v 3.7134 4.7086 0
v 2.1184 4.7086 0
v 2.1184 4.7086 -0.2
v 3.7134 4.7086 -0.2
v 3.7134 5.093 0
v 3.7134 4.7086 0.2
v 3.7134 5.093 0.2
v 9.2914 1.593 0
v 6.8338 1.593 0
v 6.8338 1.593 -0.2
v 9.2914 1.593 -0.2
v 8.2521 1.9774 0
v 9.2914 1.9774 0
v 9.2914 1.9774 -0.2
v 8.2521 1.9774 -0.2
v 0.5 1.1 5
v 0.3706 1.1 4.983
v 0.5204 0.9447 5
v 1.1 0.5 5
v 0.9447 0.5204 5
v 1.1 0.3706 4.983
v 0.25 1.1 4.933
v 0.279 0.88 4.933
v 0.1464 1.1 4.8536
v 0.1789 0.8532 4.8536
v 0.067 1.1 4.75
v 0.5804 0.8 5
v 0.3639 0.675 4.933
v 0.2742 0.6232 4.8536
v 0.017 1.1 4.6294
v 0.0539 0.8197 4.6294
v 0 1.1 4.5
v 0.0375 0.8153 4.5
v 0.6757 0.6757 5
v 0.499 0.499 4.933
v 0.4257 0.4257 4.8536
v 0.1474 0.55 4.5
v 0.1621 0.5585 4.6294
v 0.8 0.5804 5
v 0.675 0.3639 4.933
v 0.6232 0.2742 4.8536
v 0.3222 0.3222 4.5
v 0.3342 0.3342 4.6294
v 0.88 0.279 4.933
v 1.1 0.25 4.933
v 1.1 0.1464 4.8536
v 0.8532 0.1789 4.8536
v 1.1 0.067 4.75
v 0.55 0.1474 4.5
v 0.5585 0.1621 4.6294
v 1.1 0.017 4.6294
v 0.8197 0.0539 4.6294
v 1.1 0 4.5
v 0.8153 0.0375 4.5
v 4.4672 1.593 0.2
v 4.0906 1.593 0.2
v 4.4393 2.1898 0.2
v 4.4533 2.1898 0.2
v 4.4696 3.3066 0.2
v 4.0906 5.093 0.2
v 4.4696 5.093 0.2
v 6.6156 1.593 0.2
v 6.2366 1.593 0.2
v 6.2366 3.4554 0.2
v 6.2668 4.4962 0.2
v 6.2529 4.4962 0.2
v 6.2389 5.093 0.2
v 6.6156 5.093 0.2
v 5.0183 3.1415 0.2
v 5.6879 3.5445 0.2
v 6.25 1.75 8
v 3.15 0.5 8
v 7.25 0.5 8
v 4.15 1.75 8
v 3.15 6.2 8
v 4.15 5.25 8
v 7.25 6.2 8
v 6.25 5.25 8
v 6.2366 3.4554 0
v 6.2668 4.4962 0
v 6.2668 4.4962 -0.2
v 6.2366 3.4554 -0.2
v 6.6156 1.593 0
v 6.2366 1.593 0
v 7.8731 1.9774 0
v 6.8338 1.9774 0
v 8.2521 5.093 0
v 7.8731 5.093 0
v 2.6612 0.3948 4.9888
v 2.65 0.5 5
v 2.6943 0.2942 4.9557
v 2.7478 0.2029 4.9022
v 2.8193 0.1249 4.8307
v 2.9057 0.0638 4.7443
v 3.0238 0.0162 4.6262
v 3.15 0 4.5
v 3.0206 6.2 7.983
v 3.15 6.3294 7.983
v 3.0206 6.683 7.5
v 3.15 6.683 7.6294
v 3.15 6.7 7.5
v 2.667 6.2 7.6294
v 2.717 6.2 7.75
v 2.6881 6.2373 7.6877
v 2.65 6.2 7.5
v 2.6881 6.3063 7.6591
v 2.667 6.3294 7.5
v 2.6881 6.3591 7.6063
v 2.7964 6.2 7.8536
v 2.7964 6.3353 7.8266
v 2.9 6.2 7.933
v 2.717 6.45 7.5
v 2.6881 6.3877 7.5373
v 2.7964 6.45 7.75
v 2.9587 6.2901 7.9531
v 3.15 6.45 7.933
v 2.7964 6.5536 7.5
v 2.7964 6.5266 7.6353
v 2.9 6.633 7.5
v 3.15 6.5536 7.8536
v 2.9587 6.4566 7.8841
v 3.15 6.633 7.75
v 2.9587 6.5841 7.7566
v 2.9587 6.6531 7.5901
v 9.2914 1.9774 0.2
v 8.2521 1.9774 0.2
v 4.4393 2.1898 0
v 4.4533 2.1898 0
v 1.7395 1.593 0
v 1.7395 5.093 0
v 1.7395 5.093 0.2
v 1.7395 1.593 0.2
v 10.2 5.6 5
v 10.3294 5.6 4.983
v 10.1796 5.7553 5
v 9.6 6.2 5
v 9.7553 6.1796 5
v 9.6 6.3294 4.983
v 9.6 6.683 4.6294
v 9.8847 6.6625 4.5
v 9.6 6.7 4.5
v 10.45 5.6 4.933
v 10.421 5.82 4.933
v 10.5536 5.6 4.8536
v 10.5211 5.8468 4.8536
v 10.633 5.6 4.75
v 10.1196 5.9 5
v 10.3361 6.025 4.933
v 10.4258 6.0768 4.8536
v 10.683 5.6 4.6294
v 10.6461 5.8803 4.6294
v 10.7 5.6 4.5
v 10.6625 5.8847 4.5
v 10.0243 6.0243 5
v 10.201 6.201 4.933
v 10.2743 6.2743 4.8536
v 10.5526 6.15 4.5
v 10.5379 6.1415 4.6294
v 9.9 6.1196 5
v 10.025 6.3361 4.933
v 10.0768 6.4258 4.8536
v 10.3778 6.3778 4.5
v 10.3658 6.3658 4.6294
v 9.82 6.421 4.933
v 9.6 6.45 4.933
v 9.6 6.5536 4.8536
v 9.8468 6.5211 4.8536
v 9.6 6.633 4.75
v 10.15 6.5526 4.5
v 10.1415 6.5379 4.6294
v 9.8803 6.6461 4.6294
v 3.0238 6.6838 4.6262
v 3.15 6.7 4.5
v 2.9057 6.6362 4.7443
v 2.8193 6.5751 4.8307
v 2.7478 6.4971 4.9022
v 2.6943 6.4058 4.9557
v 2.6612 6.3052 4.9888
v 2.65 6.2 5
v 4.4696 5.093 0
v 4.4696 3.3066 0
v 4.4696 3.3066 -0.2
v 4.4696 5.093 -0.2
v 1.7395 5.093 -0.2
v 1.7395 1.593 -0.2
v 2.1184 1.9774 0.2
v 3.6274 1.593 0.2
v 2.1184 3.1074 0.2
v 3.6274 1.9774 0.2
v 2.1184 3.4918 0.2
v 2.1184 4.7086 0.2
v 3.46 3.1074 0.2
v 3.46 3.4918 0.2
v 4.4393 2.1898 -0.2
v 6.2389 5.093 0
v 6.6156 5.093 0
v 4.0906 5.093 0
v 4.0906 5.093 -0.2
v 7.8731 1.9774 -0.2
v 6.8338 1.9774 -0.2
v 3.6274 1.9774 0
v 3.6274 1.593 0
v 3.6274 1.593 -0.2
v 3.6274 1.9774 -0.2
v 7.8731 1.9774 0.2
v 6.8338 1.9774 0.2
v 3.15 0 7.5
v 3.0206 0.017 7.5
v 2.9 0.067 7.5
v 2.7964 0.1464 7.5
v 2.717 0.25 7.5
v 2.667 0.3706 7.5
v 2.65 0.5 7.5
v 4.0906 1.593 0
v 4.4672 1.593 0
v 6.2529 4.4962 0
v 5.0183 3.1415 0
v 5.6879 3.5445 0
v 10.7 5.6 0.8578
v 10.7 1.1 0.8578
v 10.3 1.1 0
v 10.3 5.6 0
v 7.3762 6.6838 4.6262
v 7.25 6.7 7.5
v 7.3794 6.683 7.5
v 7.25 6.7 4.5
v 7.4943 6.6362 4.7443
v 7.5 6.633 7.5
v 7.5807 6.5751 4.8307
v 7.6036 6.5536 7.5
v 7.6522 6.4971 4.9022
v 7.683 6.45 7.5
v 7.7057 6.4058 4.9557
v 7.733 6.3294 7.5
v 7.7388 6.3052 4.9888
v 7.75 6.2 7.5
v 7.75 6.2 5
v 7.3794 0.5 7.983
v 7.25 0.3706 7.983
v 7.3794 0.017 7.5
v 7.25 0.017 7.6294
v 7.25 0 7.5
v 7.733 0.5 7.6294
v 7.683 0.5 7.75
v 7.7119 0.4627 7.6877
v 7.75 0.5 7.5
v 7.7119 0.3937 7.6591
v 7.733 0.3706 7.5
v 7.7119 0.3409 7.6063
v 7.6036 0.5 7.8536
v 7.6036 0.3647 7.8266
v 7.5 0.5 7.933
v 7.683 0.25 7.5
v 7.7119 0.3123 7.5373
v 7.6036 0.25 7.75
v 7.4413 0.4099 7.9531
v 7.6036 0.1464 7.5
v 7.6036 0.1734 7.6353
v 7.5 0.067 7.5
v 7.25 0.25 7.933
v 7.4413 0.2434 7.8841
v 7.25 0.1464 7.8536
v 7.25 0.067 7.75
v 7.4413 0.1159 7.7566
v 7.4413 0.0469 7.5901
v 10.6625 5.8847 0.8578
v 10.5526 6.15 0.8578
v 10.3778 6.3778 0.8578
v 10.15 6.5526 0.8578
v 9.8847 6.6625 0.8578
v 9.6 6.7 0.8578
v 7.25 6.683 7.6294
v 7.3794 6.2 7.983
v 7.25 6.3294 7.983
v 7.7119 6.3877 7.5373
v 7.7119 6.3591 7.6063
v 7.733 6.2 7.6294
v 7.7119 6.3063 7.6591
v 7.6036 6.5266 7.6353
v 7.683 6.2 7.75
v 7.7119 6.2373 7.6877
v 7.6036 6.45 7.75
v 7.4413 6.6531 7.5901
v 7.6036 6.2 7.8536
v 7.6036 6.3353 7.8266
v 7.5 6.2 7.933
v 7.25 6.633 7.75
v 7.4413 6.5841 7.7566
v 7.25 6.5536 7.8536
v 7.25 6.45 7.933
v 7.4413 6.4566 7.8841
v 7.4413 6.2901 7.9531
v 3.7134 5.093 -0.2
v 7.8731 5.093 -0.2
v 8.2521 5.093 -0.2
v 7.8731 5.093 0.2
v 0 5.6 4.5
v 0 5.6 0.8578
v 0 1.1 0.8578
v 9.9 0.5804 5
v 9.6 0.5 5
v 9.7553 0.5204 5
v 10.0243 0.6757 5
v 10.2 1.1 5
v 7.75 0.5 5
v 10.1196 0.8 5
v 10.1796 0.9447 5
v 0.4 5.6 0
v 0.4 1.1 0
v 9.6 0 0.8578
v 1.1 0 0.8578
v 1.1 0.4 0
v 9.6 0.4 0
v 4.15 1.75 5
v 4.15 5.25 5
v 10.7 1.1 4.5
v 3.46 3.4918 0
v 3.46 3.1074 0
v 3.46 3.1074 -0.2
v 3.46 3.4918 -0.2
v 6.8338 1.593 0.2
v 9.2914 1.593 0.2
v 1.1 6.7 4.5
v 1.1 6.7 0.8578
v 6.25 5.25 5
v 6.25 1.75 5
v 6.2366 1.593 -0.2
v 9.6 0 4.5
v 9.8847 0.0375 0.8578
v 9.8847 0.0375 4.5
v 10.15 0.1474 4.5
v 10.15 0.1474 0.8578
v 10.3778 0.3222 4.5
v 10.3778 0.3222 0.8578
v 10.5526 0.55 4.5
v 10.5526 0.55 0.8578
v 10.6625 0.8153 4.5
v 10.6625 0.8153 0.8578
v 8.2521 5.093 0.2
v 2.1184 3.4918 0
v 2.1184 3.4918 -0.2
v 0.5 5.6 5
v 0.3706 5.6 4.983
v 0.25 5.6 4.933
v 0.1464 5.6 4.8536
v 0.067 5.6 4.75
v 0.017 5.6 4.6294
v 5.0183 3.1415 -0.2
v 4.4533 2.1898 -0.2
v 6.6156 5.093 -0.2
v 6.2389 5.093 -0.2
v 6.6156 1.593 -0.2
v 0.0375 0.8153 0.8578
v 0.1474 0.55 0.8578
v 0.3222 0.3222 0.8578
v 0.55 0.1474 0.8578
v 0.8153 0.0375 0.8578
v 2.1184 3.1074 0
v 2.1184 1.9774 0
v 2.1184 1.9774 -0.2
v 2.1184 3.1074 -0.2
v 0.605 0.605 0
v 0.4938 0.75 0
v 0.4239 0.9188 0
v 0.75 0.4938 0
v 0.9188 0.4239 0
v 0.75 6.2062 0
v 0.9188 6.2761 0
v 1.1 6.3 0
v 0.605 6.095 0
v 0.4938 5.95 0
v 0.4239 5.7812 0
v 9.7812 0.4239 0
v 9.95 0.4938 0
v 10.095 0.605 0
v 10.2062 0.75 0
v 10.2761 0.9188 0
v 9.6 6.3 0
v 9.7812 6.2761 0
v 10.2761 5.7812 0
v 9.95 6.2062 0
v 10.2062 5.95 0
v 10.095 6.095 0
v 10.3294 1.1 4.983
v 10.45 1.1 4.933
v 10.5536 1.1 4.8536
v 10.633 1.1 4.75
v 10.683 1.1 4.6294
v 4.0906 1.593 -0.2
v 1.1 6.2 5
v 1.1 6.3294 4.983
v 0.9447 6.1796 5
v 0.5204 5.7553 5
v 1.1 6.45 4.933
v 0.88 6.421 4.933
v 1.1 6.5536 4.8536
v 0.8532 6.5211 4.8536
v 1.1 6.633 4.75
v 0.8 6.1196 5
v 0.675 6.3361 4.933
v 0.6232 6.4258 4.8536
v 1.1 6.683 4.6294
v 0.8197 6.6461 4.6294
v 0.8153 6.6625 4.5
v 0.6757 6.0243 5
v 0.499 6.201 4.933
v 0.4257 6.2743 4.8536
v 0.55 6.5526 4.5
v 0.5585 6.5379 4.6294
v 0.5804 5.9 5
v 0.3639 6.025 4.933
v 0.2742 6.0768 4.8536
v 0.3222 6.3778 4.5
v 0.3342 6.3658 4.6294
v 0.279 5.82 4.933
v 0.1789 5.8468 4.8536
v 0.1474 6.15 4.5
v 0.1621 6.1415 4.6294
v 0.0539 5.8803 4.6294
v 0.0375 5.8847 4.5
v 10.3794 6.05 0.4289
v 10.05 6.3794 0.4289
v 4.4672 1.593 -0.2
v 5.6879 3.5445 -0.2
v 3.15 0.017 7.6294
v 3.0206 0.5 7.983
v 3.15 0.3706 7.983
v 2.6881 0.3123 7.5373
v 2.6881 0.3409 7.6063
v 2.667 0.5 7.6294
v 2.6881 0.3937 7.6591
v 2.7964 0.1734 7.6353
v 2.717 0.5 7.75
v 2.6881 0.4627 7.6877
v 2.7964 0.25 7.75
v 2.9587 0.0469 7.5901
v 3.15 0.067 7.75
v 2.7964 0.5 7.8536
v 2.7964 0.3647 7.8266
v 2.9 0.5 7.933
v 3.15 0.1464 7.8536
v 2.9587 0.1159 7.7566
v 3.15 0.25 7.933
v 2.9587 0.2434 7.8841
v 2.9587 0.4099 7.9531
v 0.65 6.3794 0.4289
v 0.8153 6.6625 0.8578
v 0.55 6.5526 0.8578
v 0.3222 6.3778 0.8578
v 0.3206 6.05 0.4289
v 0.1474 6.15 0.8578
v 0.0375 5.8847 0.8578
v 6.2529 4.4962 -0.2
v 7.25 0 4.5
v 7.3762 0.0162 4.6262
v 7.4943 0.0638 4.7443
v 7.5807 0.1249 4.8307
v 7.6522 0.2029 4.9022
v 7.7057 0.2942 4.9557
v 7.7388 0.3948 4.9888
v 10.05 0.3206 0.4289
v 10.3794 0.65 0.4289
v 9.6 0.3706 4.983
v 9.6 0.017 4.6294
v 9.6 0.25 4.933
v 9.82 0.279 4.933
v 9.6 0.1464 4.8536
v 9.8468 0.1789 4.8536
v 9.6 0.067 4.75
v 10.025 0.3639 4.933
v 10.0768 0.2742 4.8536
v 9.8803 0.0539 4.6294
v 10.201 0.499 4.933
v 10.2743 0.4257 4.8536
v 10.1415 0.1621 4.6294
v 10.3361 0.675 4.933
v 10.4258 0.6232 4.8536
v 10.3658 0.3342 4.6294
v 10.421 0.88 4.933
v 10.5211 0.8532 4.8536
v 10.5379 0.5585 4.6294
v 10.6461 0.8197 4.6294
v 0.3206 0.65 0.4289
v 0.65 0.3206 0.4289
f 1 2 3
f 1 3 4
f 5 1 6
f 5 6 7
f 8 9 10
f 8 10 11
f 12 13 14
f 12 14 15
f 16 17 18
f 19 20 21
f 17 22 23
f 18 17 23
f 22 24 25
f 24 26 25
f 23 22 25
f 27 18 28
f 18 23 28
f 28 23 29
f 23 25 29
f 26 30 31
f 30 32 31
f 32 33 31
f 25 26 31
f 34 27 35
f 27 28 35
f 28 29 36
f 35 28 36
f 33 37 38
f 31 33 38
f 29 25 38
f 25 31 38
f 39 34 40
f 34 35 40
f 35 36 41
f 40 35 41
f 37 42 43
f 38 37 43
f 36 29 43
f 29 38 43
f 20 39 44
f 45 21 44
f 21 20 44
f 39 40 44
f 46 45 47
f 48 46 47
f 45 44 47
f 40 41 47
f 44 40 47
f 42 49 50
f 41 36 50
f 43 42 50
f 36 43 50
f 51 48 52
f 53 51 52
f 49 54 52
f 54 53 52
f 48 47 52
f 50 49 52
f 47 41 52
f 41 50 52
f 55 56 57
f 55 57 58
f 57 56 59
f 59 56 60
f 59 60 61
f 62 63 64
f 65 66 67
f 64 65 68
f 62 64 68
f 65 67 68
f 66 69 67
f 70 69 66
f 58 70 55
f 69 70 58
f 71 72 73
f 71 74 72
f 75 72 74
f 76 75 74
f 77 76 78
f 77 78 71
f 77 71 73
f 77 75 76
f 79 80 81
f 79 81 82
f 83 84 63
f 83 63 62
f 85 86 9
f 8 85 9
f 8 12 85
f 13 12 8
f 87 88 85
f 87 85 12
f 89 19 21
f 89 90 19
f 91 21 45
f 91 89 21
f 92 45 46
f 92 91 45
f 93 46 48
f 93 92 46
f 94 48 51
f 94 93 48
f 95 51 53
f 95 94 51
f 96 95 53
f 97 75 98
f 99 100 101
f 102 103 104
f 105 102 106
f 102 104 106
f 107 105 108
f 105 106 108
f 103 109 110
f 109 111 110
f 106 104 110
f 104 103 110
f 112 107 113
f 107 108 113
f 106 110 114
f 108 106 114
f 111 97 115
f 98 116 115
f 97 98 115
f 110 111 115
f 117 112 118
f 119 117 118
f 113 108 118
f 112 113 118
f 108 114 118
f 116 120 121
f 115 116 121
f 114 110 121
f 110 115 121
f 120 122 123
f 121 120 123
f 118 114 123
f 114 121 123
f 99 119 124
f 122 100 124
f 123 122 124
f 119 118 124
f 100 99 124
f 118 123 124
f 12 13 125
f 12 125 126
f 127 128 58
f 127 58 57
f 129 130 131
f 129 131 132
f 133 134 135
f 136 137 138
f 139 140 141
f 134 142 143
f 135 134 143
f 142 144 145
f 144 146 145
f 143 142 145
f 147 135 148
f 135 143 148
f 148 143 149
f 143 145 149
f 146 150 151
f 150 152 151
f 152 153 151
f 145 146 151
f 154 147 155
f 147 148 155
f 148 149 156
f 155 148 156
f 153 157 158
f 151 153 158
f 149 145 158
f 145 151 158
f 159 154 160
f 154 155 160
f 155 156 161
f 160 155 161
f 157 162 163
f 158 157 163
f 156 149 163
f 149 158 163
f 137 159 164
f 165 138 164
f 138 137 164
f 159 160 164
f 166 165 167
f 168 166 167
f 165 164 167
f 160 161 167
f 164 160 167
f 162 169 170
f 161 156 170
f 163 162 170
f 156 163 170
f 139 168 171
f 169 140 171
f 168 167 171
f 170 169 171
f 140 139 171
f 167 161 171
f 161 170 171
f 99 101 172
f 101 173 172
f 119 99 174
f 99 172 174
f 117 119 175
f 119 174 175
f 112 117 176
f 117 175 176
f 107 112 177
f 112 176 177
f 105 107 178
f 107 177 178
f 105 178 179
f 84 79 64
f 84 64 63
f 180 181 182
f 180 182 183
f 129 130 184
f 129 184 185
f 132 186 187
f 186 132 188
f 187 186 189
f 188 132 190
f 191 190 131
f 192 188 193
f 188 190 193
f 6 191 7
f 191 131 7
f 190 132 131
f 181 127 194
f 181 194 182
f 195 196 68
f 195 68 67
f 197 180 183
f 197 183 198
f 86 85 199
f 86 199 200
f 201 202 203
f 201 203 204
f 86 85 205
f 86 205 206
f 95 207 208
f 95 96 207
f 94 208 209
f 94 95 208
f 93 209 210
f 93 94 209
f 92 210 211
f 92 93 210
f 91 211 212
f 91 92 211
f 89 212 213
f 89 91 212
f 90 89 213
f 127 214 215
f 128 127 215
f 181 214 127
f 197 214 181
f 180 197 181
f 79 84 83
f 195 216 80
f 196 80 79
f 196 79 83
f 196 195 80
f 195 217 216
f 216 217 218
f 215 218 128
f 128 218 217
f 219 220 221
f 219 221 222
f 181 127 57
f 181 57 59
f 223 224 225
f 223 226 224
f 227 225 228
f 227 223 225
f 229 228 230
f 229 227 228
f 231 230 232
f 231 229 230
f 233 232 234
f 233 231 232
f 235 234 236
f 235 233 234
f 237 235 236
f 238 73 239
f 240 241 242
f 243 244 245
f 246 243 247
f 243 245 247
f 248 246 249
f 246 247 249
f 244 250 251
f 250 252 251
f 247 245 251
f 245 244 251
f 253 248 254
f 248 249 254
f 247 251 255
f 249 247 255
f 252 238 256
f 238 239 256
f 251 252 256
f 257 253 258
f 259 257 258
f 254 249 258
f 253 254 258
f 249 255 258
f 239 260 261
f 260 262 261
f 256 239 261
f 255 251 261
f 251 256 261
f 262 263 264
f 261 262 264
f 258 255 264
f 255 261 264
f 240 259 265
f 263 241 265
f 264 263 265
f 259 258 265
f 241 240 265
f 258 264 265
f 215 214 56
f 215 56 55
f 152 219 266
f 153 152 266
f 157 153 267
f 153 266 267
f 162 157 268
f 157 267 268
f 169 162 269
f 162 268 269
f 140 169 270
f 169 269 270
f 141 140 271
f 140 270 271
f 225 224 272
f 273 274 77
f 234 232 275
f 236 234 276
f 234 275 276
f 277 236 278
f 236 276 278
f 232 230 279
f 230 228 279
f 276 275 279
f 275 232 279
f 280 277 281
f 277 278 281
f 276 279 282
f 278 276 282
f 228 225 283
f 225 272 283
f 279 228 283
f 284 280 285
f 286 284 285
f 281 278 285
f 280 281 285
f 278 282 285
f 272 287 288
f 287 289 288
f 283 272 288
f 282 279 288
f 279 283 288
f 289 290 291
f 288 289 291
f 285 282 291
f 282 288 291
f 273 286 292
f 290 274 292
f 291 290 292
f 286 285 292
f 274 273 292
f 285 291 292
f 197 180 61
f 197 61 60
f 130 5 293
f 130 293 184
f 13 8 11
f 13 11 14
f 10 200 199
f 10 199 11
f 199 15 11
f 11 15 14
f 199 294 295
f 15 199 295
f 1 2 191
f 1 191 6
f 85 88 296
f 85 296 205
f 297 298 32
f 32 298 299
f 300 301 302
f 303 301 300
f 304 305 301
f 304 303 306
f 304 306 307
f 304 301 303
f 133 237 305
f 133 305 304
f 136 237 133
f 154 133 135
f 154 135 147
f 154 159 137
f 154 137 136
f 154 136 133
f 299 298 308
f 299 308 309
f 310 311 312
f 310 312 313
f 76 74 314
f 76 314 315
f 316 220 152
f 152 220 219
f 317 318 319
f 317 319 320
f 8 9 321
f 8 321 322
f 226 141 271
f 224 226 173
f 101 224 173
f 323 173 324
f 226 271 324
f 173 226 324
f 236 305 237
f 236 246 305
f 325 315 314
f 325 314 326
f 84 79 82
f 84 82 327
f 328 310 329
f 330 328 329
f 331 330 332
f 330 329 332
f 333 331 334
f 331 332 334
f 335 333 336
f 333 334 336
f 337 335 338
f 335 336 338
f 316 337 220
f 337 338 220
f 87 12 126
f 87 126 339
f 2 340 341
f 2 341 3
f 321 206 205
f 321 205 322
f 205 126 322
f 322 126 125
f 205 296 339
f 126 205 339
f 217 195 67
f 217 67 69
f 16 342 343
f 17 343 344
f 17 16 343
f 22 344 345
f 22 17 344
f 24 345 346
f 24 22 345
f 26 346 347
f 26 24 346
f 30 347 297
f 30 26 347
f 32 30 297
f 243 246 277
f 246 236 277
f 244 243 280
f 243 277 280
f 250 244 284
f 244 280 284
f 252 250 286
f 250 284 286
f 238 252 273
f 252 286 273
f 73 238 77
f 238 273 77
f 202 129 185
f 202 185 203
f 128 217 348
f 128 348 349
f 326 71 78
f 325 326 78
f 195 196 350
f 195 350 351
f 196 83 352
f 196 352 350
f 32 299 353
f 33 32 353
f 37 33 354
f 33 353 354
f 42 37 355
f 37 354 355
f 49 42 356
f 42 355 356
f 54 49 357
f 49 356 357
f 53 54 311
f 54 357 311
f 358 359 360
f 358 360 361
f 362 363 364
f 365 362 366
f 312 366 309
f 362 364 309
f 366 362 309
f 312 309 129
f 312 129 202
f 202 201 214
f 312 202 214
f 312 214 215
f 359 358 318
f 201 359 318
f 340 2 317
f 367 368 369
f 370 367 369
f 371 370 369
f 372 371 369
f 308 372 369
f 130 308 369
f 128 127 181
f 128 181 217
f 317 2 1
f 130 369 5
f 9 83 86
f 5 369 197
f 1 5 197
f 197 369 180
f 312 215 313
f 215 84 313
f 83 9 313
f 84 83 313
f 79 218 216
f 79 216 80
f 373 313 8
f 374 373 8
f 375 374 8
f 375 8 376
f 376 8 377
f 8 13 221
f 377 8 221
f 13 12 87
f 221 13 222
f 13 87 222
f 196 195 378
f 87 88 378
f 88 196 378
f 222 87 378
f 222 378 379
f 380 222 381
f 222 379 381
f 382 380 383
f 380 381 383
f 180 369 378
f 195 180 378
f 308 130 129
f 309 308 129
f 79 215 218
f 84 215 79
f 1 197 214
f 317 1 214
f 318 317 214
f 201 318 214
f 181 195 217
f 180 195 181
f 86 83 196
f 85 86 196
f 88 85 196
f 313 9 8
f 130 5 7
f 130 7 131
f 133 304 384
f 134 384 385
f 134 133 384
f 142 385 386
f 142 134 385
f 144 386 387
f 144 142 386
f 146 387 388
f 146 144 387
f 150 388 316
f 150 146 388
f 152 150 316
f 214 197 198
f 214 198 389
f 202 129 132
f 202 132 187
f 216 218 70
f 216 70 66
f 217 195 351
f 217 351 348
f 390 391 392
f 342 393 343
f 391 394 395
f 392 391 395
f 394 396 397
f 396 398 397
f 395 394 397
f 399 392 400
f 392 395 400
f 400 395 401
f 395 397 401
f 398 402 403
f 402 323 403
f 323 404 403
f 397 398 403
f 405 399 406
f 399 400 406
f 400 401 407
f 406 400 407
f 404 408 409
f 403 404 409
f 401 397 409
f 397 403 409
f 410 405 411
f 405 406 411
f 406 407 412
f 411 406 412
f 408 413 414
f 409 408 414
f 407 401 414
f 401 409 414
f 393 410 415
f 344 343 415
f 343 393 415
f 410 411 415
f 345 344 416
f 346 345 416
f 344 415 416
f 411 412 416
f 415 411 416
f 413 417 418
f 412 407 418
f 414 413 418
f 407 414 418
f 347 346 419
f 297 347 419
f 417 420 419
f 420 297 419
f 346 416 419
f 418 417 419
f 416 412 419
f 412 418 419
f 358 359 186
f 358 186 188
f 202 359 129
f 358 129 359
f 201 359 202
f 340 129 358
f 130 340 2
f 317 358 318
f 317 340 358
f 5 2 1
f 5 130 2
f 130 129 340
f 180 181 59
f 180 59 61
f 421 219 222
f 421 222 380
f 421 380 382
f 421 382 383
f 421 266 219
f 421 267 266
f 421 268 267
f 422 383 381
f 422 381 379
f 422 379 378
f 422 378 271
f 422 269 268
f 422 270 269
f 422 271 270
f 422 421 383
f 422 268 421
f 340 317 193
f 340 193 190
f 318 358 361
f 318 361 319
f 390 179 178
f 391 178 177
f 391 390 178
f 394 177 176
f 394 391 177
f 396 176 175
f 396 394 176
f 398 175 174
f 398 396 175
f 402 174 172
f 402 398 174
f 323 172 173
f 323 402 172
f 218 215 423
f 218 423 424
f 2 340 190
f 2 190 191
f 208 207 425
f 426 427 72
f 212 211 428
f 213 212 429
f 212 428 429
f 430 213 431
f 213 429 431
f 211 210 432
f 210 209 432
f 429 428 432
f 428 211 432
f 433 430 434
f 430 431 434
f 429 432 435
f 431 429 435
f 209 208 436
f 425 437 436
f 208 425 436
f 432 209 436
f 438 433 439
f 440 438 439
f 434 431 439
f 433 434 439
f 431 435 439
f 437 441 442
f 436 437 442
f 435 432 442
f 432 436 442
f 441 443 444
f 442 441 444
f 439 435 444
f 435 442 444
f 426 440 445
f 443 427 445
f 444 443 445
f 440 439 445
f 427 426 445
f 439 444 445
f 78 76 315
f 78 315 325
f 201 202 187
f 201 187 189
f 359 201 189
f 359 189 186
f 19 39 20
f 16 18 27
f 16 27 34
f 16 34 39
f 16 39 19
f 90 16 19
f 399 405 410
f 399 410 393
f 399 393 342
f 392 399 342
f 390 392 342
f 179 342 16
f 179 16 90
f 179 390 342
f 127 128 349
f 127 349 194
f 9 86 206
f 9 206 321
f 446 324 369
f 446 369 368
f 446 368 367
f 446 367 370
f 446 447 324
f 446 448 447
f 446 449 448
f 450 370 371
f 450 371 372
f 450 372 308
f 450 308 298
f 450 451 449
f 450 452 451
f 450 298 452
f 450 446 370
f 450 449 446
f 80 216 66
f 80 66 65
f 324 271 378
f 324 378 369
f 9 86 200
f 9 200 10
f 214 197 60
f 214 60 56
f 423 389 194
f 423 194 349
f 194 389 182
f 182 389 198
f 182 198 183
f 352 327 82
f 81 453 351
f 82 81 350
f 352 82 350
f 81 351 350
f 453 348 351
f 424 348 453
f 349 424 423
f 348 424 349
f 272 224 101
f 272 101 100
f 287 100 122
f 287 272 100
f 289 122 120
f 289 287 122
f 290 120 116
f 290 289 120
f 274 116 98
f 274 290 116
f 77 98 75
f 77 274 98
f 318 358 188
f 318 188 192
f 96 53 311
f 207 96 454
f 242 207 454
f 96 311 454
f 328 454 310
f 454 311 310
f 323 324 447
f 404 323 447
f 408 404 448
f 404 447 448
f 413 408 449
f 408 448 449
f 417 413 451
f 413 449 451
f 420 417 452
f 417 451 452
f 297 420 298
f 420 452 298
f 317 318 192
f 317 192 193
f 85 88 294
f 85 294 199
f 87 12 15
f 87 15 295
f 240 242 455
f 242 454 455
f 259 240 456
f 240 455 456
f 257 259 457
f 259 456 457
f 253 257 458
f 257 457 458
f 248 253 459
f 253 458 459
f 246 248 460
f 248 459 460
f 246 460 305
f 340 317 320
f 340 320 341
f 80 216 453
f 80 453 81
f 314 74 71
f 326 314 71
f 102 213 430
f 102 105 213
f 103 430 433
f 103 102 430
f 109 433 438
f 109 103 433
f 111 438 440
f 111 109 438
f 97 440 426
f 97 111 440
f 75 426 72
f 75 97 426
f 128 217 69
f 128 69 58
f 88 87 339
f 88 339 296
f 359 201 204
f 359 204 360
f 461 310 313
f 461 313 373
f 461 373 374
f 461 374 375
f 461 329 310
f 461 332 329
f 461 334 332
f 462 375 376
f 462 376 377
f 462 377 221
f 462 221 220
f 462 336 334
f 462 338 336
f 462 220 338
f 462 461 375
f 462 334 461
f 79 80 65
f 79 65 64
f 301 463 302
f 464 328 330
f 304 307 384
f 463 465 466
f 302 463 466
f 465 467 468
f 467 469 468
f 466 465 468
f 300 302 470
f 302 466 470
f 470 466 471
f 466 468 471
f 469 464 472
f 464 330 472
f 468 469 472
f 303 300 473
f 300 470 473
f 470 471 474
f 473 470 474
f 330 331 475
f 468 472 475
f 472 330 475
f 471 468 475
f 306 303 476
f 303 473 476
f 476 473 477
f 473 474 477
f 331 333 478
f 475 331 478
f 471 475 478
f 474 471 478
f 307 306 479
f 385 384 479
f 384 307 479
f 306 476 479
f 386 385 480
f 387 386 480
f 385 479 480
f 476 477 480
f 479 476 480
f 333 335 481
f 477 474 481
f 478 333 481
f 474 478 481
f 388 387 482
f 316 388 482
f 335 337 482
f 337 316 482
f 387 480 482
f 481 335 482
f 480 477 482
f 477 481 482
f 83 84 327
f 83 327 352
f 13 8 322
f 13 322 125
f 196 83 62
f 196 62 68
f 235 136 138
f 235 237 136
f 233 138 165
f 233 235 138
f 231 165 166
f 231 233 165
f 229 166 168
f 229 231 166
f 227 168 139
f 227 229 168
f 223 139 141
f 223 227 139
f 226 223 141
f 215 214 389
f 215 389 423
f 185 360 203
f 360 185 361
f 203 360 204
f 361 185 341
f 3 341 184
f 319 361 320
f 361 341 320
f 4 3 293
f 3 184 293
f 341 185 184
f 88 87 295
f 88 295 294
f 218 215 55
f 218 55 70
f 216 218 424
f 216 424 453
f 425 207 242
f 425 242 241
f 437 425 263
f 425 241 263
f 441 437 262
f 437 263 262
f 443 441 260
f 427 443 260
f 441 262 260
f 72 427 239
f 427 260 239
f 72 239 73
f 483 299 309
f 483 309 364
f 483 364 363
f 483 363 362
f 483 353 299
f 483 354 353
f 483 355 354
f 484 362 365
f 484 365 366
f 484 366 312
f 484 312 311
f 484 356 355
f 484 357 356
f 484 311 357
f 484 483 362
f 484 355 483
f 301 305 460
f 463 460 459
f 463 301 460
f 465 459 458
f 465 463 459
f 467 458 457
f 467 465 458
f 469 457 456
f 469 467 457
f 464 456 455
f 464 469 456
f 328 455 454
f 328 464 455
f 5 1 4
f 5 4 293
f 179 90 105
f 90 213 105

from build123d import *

# Parameters (mm, degrees)
BOSS_EXTRU_1_DEPTH      = 8
ESQUISSE3_W             = 2.1
ESQUISSE3_H             = 3.5
ENL_V_MAT_EXTRU_1_DEPTH = 3
ESQUISSE4_OUTSIDE_W     = 15.69
ESQUISSE4_OUTSIDE_H     = 11.69
ESQUISSE4_OUTSIDE_W_2   = 5.1
ESQUISSE4_OUTSIDE_H_2   = 6.7
ENL_V_MAT_EXTRU_2_DEPTH = 3
CONG_1_R                = 0.5
CHANFREIN1_SIZE         = 0.4
CHANFREIN1_SIZE2        = 0.857802768
ENL_V_MAT_EXTRU_3_DEPTH = 0.2
BOSS_EXTRU_2_DEPTH      = 0.2
BOSS_EXTRU_2_2_DEPTH    = 0.2
BOSS_EXTRU_2_3_DEPTH    = 0.2


with BuildPart() as part:
    # Esquisse2 → Boss.-Extru.1 (new body)
    with BuildSketch(Plane.XY):
        with BuildLine():
            Line((1.1, 0), (9.6, 0))
            ThreePointArc((9.6, 0), (10.377817459, 0.322182541), (10.7, 1.1))
            Line((10.7, 1.1), (10.7, 5.6))
            ThreePointArc((10.7, 5.6), (10.377817459, 6.377817459), (9.6, 6.7))
            Line((9.6, 6.7), (1.1, 6.7))
            ThreePointArc((1.1, 6.7), (0.322182541, 6.377817459), (0, 5.6))
            Line((0, 5.6), (0, 1.1))
            ThreePointArc((0, 1.1), (0.322182541, 0.322182541), (1.1, 0))
        make_face()
    extrude(amount=BOSS_EXTRU_1_DEPTH)

    # Esquisse3 → Enlèv. mat.-Extru.1 (cut)
    with BuildSketch(Plane.XY.offset(8)):
        with Locations((5.2, 3.5)):
            Rectangle(ESQUISSE3_W, ESQUISSE3_H)
    extrude(amount=-ENL_V_MAT_EXTRU_1_DEPTH, mode=Mode.SUBTRACT)

    # Esquisse4 outside → Enlèv. mat.-Extru.2 (cut)
    with BuildSketch(Plane.XY.offset(8)):
        with Locations((5.35, 3.35)):
            Rectangle(ESQUISSE4_OUTSIDE_W, ESQUISSE4_OUTSIDE_H)
        with Locations((5.2, 3.35)):
            Rectangle(ESQUISSE4_OUTSIDE_W_2, ESQUISSE4_OUTSIDE_H_2, mode=Mode.SUBTRACT)
    extrude(amount=-ENL_V_MAT_EXTRU_2_DEPTH, mode=Mode.SUBTRACT)

    # Congé1
    cong_1_edges = [part.edges().sort_by_distance(p)[0] for p in [
        (8.675, 0, 5),
        (10.377817459, 0.322182541, 5),
        (10.7, 3.35, 5),
        (10.377817459, 6.377817459, 5),
        (1.875, 6.7, 5),
        (0.322182541, 6.377817459, 5),
        (1.875, 0, 5),
        (0.322182541, 0.322182541, 5),
        (7.75, 6.7, 6.5),
        (2.65, 6.7, 6.5),
        (7.75, 0, 6.5),
        (2.65, 0, 6.5),
        (2.65, 3.35, 8),
        (5.2, 6.7, 8),
        (7.75, 3.35, 8),
        (5.2, 0, 8),
        (8.675, 6.7, 5),
        (0, 3.35, 5),
    ]]
    fillet(cong_1_edges, radius=CONG_1_R)

    # Chanfrein1
    chanfrein1_edges = [part.edges().sort_by_distance(p)[0] for p in [
        (5.35, 0, 0),
        (10.377817459, 0.322182541, 0),
        (0.322182541, 0.322182541, 0),
        (10.7, 3.35, 0),
        (0, 3.35, 0),
        (10.377817459, 6.377817459, 0),
        (0.322182541, 6.377817459, 0),
        (5.35, 6.7, 0),
    ]]
    chanfrein1_side = [part.faces().sort_by_distance(p)[0] for p in [
        (5.35, 3.35, 0),
    ]]
    chamfer(chanfrein1_edges, length=CHANFREIN1_SIZE, length2=CHANFREIN1_SIZE2, reference=chanfrein1_side[0])

    # Esquisse5 → Enlèv. mat.-Extru.3 (cut)
    with BuildSketch(Plane.XY):
        Polygon((2.11844453, 4.708587918), (3.713440101, 4.708587918), (3.713440101, 5.092998901), (1.739458701, 5.092998901), (1.739458701, 1.592998901), (3.627412643, 1.592998901), (3.627412643, 1.977409884), (2.11844453, 1.977409884), (2.11844453, 3.107392169), (3.46000786, 3.107392169), (3.46000786, 3.491803153), (2.11844453, 3.491803153), align=None)
        with BuildLine():
            add(Edge.make_bspline(
                [(5.687886514, 3.544504658), (5.783379122, 3.700654457), (5.975874702, 4.015423806), (6.160061615, 4.33512635), (6.252877656, 4.49623185)],
                knots=[0, 0, 0, 0, 0.992153778, 2, 2, 2, 2], degree=3))
            Line((6.252877656, 4.49623185), (6.266828055, 4.49623185))
            add(Edge.make_bspline(
                [(6.266828055, 4.49623185), (6.258108677, 4.324471085), (6.240506943, 3.977739075), (6.237911785, 3.630569277), (6.236602191, 3.455377112)],
                knots=[0, 0, 0, 0, 0.990740747, 2, 2, 2, 2], degree=3))
            Line((6.236602191, 3.455377112), (6.236602191, 1.592998901))
            Line((6.236602191, 1.592998901), (6.615588019, 1.592998901))
            Line((6.615588019, 1.592998901), (6.615588019, 5.092998901))
            Line((6.615588019, 5.092998901), (6.238927258, 5.092998901))
            Line((6.238927258, 5.092998901), (5.018267382, 3.141493144))
            add(Edge.make_bspline(
                [(5.018267382, 3.141493144), (4.966567896, 3.058224881), (4.865182286, 2.894931114), (4.721122886, 2.652016731), (4.583012533, 2.418899666), (4.495920572, 2.265082227), (4.453276239, 2.189765951)],
                knots=[0, 0, 0, 0, 1.062550423, 2.083721383, 3.06169958, 4, 4, 4, 4], degree=3))
            Line((4.453276239, 2.189765951), (4.439325841, 2.189765951))
            add(Edge.make_bspline(
                [(4.439325841, 2.189765951), (4.444061402, 2.27267783), (4.453926705, 2.445403045), (4.462318939, 2.714672702), (4.469221198, 3.004020303), (4.469439097, 3.20348993), (4.469551704, 3.30657286)],
                knots=[0, 0, 0, 0, 0.891833965, 1.85790283, 2.892996115, 4, 4, 4, 4], degree=3))
            Line((4.469551704, 3.30657286), (4.469551704, 5.092998901))
            Line((4.469551704, 5.092998901), (4.090565876, 5.092998901))
            Line((4.090565876, 5.092998901), (4.090565876, 1.592998901))
            Line((4.090565876, 1.592998901), (4.467226638, 1.592998901))
            Line((4.467226638, 1.592998901), (5.687886514, 3.544504658))
        make_face()
        Polygon((8.252124778, 5.092998901), (7.873138949, 5.092998901), (7.873138949, 1.977409884), (6.833834255, 1.977409884), (6.833834255, 1.592998901), (9.291429472, 1.592998901), (9.291429472, 1.977409884), (8.252124778, 1.977409884), align=None)
    extrude(amount=ENL_V_MAT_EXTRU_3_DEPTH, mode=Mode.SUBTRACT)


with BuildPart() as body_2:
    # Esquisse5<4> → Boss.-Extru.2 (new body)
    with BuildSketch(Plane.XY):
        Polygon((2.11844453, 4.708587918), (3.713440101, 4.708587918), (3.713440101, 5.092998901), (1.739458701, 5.092998901), (1.739458701, 1.592998901), (3.627412643, 1.592998901), (3.627412643, 1.977409884), (2.11844453, 1.977409884), (2.11844453, 3.107392169), (3.46000786, 3.107392169), (3.46000786, 3.491803153), (2.11844453, 3.491803153), align=None)
    extrude(amount=-BOSS_EXTRU_2_DEPTH)


with BuildPart() as body_3:
    # Esquisse5<4> → Boss.-Extru.2 2 (new body)
    with BuildSketch(Plane.XY):
        with BuildLine():
            add(Edge.make_bspline(
                [(5.687886514, 3.544504658), (5.783379122, 3.700654457), (5.975874702, 4.015423806), (6.160061615, 4.33512635), (6.252877656, 4.49623185)],
                knots=[0, 0, 0, 0, 0.992153778, 2, 2, 2, 2], degree=3))
            Line((6.252877656, 4.49623185), (6.266828055, 4.49623185))
            add(Edge.make_bspline(
                [(6.266828055, 4.49623185), (6.258108677, 4.324471085), (6.240506943, 3.977739075), (6.237911785, 3.630569277), (6.236602191, 3.455377112)],
                knots=[0, 0, 0, 0, 0.990740747, 2, 2, 2, 2], degree=3))
            Line((6.236602191, 3.455377112), (6.236602191, 1.592998901))
            Line((6.236602191, 1.592998901), (6.615588019, 1.592998901))
            Line((6.615588019, 1.592998901), (6.615588019, 5.092998901))
            Line((6.615588019, 5.092998901), (6.238927258, 5.092998901))
            Line((6.238927258, 5.092998901), (5.018267382, 3.141493144))
            add(Edge.make_bspline(
                [(5.018267382, 3.141493144), (4.966567896, 3.058224881), (4.865182286, 2.894931114), (4.721122886, 2.652016731), (4.583012533, 2.418899666), (4.495920572, 2.265082227), (4.453276239, 2.189765951)],
                knots=[0, 0, 0, 0, 1.062550423, 2.083721383, 3.06169958, 4, 4, 4, 4], degree=3))
            Line((4.453276239, 2.189765951), (4.439325841, 2.189765951))
            add(Edge.make_bspline(
                [(4.439325841, 2.189765951), (4.444061402, 2.27267783), (4.453926705, 2.445403045), (4.462318939, 2.714672702), (4.469221198, 3.004020303), (4.469439097, 3.20348993), (4.469551704, 3.30657286)],
                knots=[0, 0, 0, 0, 0.891833965, 1.85790283, 2.892996115, 4, 4, 4, 4], degree=3))
            Line((4.469551704, 3.30657286), (4.469551704, 5.092998901))
            Line((4.469551704, 5.092998901), (4.090565876, 5.092998901))
            Line((4.090565876, 5.092998901), (4.090565876, 1.592998901))
            Line((4.090565876, 1.592998901), (4.467226638, 1.592998901))
            Line((4.467226638, 1.592998901), (5.687886514, 3.544504658))
        make_face()
    extrude(amount=-BOSS_EXTRU_2_2_DEPTH)


with BuildPart() as body_4:
    # Esquisse5<4> → Boss.-Extru.2 3 (new body)
    with BuildSketch(Plane.XY):
        Polygon((8.252124778, 5.092998901), (7.873138949, 5.092998901), (7.873138949, 1.977409884), (6.833834255, 1.977409884), (6.833834255, 1.592998901), (9.291429472, 1.592998901), (9.291429472, 1.977409884), (8.252124778, 1.977409884), align=None)
    extrude(amount=-BOSS_EXTRU_2_3_DEPTH)


solid = Compound([part.part, body_2.part, body_3.part, body_4.part])
